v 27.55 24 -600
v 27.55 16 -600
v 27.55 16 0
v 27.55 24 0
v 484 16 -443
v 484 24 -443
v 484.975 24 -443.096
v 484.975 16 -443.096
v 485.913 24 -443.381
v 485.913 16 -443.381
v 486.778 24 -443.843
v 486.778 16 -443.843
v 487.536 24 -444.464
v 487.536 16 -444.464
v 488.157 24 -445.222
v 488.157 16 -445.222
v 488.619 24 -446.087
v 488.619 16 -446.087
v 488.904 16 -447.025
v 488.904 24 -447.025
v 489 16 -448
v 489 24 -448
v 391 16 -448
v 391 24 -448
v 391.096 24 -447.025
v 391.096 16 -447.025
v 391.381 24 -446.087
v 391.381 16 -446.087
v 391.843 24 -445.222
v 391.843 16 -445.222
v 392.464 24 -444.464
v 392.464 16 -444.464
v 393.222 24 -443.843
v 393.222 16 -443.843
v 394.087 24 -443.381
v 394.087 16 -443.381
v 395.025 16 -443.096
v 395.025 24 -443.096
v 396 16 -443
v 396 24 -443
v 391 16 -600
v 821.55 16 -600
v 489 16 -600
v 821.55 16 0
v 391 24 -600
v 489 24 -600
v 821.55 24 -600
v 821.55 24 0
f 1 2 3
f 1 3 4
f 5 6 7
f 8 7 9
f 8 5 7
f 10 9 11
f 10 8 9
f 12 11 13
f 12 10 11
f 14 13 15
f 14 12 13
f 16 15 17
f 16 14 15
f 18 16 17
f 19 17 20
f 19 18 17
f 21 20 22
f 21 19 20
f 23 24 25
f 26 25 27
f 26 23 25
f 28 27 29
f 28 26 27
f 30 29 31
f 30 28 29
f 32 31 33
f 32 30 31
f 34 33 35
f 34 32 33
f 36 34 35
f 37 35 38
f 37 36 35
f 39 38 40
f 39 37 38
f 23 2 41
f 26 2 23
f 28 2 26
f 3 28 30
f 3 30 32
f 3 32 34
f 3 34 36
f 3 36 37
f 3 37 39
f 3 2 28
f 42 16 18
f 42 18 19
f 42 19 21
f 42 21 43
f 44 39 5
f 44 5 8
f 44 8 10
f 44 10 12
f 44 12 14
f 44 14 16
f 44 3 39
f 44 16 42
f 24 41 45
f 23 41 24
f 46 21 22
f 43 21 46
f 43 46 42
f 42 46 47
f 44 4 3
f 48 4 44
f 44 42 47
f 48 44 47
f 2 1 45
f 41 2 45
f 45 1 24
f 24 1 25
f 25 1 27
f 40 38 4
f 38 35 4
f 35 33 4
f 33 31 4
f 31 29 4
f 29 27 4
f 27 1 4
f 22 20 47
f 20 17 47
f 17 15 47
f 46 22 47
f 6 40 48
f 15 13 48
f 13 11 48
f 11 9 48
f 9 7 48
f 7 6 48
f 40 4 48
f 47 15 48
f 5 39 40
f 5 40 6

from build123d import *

# Parameters (mm, degrees)
SKETCH_1_W          = 794
SKETCH_1_H          = 8
EXTRUDE_1_DEPTH     = 600
CUT_EXTRUDE_1_DEPTH = 1018.353969246


with BuildPart() as part:
    # 草图1 → 凸台-拉伸1 (new body)
    with BuildSketch(Plane.XY):
        with Locations((424.550423736, 20)):
            Rectangle(SKETCH_1_W, SKETCH_1_H)
    extrude(amount=-EXTRUDE_1_DEPTH)

    # 草图2 → 切除-拉伸1 (cut, through all)
    with BuildSketch(Plane.XZ.offset(-16)):
        with BuildLine():
            Line((396, -443), (484, -443))
            ThreePointArc((484, -443), (487.535533906, -444.464466094), (489, -448))
            Line((489, -448), (489, -603))
            Line((489, -603), (391, -603))
            Line((391, -603), (391, -448))
            ThreePointArc((391, -448), (392.464466094, -444.464466094), (396, -443))
        make_face()
    extrude(amount=-CUT_EXTRUDE_1_DEPTH, mode=Mode.SUBTRACT)


solid = part.part
